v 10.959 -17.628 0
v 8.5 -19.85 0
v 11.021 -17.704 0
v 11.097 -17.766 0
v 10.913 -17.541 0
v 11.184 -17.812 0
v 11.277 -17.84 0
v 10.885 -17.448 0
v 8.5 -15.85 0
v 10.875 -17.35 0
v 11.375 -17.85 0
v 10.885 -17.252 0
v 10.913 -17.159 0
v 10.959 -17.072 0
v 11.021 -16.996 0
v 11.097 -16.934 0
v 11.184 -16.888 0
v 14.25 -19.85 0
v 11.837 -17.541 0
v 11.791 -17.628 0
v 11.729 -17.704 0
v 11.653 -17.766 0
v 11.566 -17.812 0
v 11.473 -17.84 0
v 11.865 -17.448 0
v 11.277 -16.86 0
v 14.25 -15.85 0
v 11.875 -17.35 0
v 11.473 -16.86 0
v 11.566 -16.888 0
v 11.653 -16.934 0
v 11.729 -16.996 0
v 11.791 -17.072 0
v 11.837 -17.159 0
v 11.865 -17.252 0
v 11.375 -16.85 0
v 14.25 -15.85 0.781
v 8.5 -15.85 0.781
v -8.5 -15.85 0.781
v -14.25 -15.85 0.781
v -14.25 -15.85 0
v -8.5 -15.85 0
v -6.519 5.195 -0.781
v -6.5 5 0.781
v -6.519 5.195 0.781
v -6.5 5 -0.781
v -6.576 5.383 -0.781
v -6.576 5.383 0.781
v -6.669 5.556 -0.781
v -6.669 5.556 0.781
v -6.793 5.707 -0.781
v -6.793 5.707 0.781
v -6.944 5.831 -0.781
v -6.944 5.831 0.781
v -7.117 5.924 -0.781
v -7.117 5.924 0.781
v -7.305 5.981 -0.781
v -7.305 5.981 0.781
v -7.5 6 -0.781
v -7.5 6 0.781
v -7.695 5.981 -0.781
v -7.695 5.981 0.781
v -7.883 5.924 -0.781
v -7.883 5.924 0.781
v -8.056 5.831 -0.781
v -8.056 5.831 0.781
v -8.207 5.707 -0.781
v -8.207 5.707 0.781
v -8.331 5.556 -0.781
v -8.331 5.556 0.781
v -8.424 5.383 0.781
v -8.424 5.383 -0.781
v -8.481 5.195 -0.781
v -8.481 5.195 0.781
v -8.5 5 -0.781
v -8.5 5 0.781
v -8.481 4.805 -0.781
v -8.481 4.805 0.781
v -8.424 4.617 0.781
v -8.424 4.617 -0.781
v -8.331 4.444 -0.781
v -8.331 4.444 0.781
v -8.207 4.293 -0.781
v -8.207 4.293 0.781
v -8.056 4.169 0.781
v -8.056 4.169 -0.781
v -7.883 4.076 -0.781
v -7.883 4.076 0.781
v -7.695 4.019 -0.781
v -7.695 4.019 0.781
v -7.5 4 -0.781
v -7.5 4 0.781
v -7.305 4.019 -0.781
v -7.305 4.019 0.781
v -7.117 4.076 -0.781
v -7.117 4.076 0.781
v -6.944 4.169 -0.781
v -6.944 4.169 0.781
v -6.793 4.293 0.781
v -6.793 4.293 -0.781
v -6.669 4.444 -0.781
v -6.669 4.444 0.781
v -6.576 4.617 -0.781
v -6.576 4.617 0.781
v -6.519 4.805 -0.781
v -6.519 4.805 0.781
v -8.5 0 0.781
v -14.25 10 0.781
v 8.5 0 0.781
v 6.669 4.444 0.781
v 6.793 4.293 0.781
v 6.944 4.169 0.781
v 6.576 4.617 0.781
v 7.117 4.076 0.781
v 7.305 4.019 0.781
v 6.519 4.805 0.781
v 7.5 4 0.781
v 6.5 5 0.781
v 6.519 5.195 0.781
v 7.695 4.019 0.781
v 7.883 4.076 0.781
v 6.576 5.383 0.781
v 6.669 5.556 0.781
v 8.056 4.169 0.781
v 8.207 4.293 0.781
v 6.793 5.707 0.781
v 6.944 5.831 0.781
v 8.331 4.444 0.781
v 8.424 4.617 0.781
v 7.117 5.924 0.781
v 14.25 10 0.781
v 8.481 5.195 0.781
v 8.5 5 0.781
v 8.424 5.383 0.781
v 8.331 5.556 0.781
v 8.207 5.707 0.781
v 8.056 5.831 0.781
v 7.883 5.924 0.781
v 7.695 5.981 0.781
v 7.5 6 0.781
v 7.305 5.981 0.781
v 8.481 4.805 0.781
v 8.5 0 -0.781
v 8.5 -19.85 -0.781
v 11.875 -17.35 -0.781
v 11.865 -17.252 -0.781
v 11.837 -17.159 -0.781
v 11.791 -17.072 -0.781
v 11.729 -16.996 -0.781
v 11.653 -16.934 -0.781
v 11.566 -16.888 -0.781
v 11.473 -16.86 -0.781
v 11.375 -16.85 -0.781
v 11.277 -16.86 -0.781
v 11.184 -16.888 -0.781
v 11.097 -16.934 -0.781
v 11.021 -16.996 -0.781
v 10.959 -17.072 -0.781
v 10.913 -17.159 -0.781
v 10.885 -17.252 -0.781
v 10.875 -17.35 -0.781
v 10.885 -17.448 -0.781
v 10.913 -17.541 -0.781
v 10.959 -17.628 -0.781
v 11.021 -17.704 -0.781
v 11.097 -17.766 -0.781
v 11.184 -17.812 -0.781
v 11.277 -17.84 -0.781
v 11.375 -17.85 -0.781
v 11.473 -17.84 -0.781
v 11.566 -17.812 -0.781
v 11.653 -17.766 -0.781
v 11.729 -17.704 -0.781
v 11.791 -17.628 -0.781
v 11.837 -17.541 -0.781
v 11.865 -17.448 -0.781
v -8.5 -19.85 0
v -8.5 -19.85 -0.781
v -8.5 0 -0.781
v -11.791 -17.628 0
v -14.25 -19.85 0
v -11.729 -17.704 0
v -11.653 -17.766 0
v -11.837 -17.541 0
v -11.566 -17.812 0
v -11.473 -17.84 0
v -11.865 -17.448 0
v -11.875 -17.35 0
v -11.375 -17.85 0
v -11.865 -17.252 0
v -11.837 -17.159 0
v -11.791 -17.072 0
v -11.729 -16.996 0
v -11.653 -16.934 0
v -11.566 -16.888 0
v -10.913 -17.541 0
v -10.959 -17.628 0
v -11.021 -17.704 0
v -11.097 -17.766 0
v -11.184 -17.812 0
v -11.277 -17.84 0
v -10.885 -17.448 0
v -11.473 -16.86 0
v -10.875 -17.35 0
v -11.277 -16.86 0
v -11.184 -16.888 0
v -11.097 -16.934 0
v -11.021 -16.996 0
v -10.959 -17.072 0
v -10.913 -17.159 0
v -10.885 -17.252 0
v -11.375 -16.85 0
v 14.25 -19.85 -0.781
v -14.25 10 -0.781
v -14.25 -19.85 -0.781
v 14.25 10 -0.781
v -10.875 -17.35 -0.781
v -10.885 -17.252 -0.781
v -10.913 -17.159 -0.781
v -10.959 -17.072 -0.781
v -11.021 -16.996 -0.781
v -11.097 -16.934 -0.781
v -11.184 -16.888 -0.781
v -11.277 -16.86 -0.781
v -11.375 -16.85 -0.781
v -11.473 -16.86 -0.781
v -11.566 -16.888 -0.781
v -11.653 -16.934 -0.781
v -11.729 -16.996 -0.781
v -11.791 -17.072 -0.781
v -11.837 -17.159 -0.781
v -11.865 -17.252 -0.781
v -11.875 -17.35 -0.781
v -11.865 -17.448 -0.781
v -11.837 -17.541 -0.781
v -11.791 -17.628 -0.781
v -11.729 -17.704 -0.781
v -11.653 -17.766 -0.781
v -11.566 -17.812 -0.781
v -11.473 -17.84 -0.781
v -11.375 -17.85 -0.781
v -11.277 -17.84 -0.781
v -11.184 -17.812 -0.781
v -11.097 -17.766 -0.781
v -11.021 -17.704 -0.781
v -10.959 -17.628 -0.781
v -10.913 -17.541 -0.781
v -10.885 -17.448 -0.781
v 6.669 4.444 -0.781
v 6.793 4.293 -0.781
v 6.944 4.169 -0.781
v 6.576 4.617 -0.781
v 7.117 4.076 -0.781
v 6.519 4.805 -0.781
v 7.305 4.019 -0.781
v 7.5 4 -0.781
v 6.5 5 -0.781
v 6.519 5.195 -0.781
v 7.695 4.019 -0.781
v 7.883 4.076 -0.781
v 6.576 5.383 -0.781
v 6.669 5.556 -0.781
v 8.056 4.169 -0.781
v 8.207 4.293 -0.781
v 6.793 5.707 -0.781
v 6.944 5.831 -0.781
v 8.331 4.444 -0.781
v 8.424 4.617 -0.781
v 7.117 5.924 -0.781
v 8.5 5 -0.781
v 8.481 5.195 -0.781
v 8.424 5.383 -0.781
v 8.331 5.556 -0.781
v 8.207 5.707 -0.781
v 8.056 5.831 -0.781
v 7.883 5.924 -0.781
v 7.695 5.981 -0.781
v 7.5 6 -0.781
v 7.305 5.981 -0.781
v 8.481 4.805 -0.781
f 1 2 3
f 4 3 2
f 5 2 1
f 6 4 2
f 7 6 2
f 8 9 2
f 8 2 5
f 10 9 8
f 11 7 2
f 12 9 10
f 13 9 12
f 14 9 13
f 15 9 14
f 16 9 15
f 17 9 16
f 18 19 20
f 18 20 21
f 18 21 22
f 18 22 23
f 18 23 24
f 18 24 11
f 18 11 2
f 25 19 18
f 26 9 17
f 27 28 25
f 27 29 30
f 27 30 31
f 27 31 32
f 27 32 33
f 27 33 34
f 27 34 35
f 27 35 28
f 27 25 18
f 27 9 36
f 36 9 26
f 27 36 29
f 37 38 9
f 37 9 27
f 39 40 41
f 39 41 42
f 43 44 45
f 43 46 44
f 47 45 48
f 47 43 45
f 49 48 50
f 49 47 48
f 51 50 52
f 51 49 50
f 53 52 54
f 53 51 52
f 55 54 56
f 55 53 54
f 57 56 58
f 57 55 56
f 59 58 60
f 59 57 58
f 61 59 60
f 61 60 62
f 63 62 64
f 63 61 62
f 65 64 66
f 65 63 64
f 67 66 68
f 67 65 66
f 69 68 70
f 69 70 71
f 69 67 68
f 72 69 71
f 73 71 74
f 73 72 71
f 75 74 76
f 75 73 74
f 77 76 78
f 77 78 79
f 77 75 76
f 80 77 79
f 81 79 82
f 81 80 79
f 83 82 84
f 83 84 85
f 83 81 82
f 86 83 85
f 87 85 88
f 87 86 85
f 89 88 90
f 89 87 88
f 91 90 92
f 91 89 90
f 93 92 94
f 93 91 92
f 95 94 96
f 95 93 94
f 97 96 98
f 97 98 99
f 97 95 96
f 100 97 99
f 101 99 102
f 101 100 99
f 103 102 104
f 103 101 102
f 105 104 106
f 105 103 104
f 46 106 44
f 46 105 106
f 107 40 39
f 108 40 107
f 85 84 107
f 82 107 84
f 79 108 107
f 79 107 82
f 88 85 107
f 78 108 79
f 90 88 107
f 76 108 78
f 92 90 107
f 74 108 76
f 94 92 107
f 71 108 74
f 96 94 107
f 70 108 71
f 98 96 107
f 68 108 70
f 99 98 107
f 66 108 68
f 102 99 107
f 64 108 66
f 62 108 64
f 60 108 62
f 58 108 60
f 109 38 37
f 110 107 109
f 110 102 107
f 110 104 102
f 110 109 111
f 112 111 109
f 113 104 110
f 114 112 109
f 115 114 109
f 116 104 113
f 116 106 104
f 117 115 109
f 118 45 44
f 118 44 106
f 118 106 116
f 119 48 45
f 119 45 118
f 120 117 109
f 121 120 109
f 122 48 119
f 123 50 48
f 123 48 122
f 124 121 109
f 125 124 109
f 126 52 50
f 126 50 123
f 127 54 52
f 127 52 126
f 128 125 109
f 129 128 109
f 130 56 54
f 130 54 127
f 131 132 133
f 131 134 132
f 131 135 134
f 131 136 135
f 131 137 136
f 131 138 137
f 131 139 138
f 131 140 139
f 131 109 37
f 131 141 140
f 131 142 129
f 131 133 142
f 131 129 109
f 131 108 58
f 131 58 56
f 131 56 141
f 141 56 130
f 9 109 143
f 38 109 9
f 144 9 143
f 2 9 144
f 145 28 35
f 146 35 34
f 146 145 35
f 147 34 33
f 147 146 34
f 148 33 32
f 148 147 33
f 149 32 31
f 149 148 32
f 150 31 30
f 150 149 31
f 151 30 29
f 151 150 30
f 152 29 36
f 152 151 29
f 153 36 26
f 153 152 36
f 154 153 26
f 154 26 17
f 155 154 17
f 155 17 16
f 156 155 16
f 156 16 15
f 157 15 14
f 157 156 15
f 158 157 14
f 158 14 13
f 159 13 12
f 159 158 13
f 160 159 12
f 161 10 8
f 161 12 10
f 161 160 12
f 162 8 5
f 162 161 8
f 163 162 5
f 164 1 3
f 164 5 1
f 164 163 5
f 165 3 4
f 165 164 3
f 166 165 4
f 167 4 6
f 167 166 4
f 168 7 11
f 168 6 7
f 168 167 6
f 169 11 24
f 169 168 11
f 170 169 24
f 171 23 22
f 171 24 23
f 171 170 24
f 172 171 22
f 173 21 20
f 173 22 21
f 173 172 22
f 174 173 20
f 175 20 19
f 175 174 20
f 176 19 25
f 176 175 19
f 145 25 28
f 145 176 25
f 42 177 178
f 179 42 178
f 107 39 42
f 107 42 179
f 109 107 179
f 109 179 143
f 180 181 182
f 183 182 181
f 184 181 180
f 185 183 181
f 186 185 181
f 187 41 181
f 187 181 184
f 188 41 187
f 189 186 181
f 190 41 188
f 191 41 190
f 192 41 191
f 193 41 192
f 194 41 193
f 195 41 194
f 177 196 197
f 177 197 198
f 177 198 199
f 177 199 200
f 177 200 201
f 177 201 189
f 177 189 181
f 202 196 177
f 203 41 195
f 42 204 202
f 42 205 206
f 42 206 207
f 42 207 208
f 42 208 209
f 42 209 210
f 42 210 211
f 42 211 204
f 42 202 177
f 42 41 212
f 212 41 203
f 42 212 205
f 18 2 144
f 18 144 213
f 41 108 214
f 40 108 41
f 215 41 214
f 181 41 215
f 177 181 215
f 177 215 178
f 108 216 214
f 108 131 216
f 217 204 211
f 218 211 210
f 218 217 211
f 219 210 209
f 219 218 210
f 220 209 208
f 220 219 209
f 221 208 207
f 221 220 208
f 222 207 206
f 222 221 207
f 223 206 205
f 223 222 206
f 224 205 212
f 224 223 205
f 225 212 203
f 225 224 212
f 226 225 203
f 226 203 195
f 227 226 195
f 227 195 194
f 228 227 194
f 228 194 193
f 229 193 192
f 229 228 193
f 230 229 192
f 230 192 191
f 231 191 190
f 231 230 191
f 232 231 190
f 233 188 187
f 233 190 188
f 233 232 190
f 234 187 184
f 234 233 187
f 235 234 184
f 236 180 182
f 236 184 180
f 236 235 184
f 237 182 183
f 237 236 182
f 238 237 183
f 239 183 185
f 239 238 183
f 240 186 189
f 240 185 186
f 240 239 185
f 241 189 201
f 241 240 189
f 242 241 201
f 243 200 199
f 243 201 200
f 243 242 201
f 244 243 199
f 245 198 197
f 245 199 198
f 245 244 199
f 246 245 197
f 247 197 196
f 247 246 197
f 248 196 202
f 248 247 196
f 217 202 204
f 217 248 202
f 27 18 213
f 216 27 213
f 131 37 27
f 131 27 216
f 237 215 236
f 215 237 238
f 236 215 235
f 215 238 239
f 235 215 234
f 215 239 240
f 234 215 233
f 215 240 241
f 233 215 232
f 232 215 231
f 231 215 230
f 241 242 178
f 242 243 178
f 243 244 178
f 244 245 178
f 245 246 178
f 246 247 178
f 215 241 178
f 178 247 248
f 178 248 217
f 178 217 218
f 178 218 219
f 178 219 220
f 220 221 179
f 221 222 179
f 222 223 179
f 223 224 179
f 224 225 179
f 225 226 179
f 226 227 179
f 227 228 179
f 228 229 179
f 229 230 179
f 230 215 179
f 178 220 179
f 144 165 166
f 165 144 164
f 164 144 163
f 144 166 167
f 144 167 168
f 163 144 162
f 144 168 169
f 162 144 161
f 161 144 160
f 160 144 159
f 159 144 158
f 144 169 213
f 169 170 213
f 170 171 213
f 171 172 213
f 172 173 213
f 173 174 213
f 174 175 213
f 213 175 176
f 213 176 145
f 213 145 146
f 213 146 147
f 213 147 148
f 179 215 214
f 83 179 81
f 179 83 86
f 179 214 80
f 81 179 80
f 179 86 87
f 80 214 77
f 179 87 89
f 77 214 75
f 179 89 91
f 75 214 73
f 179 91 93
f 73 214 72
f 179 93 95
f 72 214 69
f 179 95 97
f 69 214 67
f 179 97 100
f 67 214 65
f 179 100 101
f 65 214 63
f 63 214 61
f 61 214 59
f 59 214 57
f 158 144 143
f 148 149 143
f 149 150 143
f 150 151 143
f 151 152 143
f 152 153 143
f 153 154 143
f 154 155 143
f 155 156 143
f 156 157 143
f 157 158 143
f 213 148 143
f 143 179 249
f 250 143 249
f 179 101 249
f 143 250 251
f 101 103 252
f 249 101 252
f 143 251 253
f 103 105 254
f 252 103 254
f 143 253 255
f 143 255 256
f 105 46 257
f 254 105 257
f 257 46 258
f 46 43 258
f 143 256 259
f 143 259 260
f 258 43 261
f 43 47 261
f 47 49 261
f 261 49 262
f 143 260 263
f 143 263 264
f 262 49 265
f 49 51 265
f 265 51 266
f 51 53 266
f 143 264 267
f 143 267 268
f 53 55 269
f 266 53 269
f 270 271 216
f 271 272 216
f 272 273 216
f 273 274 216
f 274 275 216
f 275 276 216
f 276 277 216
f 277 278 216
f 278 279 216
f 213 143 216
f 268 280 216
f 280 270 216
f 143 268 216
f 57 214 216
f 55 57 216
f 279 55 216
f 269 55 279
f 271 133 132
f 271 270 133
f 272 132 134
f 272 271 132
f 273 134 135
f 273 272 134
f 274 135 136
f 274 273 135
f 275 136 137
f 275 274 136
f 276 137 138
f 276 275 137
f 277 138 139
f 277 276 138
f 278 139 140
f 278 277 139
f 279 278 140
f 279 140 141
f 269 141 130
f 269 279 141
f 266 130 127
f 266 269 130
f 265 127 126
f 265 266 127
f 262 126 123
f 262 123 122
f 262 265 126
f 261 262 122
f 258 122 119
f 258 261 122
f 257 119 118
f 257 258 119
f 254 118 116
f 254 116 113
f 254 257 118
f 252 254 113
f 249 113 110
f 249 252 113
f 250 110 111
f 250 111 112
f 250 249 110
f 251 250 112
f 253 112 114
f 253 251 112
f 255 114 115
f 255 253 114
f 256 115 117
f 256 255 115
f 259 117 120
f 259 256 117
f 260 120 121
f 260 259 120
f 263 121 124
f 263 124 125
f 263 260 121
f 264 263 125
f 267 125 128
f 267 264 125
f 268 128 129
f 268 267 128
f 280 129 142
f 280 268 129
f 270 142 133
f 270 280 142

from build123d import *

# Parameters (mm, degrees)
SKETCH1_R           = 1
SKETCH1_R_2         = 0.5
BOSS_EXTRUDE1_DEPTH = 0.781250025
SKETCH2_W           = 5.75
SKETCH2_H           = 4
CUT_EXTRUDE1_DEPTH  = 0.781250025


with BuildPart() as part:
    # Sketch1 → Boss-Extrude1 (new, symmetric)
    with BuildSketch(Plane.XY):
        Polygon((-8.5, -19.85), (-8.5, 0), (8.5, 0), (8.5, -19.85), (14.25, -19.85), (14.25, 10), (-14.25, 10), (-14.25, -19.85), align=None)
        with Locations((-7.5, 5)):
            Circle(SKETCH1_R, mode=Mode.SUBTRACT)
        with Locations((7.5, 5)):
            Circle(SKETCH1_R, mode=Mode.SUBTRACT)
        with Locations((-11.375, -17.35)):
            Circle(SKETCH1_R_2, mode=Mode.SUBTRACT)
        with Locations((11.375, -17.35)):
            Circle(SKETCH1_R_2, mode=Mode.SUBTRACT)
    extrude(amount=BOSS_EXTRUDE1_DEPTH, both=True)

    # Sketch2 → Cut-Extrude1 (cut)
    with BuildSketch(Plane.XY.offset(0.781250025)):
        with Locations((-11.375, -17.85)):
            Rectangle(SKETCH2_W, SKETCH2_H)
        with Locations((11.375, -17.85)):
            Rectangle(SKETCH2_W, SKETCH2_H)
    extrude(amount=-CUT_EXTRUDE1_DEPTH, mode=Mode.SUBTRACT)


solid = part.part
